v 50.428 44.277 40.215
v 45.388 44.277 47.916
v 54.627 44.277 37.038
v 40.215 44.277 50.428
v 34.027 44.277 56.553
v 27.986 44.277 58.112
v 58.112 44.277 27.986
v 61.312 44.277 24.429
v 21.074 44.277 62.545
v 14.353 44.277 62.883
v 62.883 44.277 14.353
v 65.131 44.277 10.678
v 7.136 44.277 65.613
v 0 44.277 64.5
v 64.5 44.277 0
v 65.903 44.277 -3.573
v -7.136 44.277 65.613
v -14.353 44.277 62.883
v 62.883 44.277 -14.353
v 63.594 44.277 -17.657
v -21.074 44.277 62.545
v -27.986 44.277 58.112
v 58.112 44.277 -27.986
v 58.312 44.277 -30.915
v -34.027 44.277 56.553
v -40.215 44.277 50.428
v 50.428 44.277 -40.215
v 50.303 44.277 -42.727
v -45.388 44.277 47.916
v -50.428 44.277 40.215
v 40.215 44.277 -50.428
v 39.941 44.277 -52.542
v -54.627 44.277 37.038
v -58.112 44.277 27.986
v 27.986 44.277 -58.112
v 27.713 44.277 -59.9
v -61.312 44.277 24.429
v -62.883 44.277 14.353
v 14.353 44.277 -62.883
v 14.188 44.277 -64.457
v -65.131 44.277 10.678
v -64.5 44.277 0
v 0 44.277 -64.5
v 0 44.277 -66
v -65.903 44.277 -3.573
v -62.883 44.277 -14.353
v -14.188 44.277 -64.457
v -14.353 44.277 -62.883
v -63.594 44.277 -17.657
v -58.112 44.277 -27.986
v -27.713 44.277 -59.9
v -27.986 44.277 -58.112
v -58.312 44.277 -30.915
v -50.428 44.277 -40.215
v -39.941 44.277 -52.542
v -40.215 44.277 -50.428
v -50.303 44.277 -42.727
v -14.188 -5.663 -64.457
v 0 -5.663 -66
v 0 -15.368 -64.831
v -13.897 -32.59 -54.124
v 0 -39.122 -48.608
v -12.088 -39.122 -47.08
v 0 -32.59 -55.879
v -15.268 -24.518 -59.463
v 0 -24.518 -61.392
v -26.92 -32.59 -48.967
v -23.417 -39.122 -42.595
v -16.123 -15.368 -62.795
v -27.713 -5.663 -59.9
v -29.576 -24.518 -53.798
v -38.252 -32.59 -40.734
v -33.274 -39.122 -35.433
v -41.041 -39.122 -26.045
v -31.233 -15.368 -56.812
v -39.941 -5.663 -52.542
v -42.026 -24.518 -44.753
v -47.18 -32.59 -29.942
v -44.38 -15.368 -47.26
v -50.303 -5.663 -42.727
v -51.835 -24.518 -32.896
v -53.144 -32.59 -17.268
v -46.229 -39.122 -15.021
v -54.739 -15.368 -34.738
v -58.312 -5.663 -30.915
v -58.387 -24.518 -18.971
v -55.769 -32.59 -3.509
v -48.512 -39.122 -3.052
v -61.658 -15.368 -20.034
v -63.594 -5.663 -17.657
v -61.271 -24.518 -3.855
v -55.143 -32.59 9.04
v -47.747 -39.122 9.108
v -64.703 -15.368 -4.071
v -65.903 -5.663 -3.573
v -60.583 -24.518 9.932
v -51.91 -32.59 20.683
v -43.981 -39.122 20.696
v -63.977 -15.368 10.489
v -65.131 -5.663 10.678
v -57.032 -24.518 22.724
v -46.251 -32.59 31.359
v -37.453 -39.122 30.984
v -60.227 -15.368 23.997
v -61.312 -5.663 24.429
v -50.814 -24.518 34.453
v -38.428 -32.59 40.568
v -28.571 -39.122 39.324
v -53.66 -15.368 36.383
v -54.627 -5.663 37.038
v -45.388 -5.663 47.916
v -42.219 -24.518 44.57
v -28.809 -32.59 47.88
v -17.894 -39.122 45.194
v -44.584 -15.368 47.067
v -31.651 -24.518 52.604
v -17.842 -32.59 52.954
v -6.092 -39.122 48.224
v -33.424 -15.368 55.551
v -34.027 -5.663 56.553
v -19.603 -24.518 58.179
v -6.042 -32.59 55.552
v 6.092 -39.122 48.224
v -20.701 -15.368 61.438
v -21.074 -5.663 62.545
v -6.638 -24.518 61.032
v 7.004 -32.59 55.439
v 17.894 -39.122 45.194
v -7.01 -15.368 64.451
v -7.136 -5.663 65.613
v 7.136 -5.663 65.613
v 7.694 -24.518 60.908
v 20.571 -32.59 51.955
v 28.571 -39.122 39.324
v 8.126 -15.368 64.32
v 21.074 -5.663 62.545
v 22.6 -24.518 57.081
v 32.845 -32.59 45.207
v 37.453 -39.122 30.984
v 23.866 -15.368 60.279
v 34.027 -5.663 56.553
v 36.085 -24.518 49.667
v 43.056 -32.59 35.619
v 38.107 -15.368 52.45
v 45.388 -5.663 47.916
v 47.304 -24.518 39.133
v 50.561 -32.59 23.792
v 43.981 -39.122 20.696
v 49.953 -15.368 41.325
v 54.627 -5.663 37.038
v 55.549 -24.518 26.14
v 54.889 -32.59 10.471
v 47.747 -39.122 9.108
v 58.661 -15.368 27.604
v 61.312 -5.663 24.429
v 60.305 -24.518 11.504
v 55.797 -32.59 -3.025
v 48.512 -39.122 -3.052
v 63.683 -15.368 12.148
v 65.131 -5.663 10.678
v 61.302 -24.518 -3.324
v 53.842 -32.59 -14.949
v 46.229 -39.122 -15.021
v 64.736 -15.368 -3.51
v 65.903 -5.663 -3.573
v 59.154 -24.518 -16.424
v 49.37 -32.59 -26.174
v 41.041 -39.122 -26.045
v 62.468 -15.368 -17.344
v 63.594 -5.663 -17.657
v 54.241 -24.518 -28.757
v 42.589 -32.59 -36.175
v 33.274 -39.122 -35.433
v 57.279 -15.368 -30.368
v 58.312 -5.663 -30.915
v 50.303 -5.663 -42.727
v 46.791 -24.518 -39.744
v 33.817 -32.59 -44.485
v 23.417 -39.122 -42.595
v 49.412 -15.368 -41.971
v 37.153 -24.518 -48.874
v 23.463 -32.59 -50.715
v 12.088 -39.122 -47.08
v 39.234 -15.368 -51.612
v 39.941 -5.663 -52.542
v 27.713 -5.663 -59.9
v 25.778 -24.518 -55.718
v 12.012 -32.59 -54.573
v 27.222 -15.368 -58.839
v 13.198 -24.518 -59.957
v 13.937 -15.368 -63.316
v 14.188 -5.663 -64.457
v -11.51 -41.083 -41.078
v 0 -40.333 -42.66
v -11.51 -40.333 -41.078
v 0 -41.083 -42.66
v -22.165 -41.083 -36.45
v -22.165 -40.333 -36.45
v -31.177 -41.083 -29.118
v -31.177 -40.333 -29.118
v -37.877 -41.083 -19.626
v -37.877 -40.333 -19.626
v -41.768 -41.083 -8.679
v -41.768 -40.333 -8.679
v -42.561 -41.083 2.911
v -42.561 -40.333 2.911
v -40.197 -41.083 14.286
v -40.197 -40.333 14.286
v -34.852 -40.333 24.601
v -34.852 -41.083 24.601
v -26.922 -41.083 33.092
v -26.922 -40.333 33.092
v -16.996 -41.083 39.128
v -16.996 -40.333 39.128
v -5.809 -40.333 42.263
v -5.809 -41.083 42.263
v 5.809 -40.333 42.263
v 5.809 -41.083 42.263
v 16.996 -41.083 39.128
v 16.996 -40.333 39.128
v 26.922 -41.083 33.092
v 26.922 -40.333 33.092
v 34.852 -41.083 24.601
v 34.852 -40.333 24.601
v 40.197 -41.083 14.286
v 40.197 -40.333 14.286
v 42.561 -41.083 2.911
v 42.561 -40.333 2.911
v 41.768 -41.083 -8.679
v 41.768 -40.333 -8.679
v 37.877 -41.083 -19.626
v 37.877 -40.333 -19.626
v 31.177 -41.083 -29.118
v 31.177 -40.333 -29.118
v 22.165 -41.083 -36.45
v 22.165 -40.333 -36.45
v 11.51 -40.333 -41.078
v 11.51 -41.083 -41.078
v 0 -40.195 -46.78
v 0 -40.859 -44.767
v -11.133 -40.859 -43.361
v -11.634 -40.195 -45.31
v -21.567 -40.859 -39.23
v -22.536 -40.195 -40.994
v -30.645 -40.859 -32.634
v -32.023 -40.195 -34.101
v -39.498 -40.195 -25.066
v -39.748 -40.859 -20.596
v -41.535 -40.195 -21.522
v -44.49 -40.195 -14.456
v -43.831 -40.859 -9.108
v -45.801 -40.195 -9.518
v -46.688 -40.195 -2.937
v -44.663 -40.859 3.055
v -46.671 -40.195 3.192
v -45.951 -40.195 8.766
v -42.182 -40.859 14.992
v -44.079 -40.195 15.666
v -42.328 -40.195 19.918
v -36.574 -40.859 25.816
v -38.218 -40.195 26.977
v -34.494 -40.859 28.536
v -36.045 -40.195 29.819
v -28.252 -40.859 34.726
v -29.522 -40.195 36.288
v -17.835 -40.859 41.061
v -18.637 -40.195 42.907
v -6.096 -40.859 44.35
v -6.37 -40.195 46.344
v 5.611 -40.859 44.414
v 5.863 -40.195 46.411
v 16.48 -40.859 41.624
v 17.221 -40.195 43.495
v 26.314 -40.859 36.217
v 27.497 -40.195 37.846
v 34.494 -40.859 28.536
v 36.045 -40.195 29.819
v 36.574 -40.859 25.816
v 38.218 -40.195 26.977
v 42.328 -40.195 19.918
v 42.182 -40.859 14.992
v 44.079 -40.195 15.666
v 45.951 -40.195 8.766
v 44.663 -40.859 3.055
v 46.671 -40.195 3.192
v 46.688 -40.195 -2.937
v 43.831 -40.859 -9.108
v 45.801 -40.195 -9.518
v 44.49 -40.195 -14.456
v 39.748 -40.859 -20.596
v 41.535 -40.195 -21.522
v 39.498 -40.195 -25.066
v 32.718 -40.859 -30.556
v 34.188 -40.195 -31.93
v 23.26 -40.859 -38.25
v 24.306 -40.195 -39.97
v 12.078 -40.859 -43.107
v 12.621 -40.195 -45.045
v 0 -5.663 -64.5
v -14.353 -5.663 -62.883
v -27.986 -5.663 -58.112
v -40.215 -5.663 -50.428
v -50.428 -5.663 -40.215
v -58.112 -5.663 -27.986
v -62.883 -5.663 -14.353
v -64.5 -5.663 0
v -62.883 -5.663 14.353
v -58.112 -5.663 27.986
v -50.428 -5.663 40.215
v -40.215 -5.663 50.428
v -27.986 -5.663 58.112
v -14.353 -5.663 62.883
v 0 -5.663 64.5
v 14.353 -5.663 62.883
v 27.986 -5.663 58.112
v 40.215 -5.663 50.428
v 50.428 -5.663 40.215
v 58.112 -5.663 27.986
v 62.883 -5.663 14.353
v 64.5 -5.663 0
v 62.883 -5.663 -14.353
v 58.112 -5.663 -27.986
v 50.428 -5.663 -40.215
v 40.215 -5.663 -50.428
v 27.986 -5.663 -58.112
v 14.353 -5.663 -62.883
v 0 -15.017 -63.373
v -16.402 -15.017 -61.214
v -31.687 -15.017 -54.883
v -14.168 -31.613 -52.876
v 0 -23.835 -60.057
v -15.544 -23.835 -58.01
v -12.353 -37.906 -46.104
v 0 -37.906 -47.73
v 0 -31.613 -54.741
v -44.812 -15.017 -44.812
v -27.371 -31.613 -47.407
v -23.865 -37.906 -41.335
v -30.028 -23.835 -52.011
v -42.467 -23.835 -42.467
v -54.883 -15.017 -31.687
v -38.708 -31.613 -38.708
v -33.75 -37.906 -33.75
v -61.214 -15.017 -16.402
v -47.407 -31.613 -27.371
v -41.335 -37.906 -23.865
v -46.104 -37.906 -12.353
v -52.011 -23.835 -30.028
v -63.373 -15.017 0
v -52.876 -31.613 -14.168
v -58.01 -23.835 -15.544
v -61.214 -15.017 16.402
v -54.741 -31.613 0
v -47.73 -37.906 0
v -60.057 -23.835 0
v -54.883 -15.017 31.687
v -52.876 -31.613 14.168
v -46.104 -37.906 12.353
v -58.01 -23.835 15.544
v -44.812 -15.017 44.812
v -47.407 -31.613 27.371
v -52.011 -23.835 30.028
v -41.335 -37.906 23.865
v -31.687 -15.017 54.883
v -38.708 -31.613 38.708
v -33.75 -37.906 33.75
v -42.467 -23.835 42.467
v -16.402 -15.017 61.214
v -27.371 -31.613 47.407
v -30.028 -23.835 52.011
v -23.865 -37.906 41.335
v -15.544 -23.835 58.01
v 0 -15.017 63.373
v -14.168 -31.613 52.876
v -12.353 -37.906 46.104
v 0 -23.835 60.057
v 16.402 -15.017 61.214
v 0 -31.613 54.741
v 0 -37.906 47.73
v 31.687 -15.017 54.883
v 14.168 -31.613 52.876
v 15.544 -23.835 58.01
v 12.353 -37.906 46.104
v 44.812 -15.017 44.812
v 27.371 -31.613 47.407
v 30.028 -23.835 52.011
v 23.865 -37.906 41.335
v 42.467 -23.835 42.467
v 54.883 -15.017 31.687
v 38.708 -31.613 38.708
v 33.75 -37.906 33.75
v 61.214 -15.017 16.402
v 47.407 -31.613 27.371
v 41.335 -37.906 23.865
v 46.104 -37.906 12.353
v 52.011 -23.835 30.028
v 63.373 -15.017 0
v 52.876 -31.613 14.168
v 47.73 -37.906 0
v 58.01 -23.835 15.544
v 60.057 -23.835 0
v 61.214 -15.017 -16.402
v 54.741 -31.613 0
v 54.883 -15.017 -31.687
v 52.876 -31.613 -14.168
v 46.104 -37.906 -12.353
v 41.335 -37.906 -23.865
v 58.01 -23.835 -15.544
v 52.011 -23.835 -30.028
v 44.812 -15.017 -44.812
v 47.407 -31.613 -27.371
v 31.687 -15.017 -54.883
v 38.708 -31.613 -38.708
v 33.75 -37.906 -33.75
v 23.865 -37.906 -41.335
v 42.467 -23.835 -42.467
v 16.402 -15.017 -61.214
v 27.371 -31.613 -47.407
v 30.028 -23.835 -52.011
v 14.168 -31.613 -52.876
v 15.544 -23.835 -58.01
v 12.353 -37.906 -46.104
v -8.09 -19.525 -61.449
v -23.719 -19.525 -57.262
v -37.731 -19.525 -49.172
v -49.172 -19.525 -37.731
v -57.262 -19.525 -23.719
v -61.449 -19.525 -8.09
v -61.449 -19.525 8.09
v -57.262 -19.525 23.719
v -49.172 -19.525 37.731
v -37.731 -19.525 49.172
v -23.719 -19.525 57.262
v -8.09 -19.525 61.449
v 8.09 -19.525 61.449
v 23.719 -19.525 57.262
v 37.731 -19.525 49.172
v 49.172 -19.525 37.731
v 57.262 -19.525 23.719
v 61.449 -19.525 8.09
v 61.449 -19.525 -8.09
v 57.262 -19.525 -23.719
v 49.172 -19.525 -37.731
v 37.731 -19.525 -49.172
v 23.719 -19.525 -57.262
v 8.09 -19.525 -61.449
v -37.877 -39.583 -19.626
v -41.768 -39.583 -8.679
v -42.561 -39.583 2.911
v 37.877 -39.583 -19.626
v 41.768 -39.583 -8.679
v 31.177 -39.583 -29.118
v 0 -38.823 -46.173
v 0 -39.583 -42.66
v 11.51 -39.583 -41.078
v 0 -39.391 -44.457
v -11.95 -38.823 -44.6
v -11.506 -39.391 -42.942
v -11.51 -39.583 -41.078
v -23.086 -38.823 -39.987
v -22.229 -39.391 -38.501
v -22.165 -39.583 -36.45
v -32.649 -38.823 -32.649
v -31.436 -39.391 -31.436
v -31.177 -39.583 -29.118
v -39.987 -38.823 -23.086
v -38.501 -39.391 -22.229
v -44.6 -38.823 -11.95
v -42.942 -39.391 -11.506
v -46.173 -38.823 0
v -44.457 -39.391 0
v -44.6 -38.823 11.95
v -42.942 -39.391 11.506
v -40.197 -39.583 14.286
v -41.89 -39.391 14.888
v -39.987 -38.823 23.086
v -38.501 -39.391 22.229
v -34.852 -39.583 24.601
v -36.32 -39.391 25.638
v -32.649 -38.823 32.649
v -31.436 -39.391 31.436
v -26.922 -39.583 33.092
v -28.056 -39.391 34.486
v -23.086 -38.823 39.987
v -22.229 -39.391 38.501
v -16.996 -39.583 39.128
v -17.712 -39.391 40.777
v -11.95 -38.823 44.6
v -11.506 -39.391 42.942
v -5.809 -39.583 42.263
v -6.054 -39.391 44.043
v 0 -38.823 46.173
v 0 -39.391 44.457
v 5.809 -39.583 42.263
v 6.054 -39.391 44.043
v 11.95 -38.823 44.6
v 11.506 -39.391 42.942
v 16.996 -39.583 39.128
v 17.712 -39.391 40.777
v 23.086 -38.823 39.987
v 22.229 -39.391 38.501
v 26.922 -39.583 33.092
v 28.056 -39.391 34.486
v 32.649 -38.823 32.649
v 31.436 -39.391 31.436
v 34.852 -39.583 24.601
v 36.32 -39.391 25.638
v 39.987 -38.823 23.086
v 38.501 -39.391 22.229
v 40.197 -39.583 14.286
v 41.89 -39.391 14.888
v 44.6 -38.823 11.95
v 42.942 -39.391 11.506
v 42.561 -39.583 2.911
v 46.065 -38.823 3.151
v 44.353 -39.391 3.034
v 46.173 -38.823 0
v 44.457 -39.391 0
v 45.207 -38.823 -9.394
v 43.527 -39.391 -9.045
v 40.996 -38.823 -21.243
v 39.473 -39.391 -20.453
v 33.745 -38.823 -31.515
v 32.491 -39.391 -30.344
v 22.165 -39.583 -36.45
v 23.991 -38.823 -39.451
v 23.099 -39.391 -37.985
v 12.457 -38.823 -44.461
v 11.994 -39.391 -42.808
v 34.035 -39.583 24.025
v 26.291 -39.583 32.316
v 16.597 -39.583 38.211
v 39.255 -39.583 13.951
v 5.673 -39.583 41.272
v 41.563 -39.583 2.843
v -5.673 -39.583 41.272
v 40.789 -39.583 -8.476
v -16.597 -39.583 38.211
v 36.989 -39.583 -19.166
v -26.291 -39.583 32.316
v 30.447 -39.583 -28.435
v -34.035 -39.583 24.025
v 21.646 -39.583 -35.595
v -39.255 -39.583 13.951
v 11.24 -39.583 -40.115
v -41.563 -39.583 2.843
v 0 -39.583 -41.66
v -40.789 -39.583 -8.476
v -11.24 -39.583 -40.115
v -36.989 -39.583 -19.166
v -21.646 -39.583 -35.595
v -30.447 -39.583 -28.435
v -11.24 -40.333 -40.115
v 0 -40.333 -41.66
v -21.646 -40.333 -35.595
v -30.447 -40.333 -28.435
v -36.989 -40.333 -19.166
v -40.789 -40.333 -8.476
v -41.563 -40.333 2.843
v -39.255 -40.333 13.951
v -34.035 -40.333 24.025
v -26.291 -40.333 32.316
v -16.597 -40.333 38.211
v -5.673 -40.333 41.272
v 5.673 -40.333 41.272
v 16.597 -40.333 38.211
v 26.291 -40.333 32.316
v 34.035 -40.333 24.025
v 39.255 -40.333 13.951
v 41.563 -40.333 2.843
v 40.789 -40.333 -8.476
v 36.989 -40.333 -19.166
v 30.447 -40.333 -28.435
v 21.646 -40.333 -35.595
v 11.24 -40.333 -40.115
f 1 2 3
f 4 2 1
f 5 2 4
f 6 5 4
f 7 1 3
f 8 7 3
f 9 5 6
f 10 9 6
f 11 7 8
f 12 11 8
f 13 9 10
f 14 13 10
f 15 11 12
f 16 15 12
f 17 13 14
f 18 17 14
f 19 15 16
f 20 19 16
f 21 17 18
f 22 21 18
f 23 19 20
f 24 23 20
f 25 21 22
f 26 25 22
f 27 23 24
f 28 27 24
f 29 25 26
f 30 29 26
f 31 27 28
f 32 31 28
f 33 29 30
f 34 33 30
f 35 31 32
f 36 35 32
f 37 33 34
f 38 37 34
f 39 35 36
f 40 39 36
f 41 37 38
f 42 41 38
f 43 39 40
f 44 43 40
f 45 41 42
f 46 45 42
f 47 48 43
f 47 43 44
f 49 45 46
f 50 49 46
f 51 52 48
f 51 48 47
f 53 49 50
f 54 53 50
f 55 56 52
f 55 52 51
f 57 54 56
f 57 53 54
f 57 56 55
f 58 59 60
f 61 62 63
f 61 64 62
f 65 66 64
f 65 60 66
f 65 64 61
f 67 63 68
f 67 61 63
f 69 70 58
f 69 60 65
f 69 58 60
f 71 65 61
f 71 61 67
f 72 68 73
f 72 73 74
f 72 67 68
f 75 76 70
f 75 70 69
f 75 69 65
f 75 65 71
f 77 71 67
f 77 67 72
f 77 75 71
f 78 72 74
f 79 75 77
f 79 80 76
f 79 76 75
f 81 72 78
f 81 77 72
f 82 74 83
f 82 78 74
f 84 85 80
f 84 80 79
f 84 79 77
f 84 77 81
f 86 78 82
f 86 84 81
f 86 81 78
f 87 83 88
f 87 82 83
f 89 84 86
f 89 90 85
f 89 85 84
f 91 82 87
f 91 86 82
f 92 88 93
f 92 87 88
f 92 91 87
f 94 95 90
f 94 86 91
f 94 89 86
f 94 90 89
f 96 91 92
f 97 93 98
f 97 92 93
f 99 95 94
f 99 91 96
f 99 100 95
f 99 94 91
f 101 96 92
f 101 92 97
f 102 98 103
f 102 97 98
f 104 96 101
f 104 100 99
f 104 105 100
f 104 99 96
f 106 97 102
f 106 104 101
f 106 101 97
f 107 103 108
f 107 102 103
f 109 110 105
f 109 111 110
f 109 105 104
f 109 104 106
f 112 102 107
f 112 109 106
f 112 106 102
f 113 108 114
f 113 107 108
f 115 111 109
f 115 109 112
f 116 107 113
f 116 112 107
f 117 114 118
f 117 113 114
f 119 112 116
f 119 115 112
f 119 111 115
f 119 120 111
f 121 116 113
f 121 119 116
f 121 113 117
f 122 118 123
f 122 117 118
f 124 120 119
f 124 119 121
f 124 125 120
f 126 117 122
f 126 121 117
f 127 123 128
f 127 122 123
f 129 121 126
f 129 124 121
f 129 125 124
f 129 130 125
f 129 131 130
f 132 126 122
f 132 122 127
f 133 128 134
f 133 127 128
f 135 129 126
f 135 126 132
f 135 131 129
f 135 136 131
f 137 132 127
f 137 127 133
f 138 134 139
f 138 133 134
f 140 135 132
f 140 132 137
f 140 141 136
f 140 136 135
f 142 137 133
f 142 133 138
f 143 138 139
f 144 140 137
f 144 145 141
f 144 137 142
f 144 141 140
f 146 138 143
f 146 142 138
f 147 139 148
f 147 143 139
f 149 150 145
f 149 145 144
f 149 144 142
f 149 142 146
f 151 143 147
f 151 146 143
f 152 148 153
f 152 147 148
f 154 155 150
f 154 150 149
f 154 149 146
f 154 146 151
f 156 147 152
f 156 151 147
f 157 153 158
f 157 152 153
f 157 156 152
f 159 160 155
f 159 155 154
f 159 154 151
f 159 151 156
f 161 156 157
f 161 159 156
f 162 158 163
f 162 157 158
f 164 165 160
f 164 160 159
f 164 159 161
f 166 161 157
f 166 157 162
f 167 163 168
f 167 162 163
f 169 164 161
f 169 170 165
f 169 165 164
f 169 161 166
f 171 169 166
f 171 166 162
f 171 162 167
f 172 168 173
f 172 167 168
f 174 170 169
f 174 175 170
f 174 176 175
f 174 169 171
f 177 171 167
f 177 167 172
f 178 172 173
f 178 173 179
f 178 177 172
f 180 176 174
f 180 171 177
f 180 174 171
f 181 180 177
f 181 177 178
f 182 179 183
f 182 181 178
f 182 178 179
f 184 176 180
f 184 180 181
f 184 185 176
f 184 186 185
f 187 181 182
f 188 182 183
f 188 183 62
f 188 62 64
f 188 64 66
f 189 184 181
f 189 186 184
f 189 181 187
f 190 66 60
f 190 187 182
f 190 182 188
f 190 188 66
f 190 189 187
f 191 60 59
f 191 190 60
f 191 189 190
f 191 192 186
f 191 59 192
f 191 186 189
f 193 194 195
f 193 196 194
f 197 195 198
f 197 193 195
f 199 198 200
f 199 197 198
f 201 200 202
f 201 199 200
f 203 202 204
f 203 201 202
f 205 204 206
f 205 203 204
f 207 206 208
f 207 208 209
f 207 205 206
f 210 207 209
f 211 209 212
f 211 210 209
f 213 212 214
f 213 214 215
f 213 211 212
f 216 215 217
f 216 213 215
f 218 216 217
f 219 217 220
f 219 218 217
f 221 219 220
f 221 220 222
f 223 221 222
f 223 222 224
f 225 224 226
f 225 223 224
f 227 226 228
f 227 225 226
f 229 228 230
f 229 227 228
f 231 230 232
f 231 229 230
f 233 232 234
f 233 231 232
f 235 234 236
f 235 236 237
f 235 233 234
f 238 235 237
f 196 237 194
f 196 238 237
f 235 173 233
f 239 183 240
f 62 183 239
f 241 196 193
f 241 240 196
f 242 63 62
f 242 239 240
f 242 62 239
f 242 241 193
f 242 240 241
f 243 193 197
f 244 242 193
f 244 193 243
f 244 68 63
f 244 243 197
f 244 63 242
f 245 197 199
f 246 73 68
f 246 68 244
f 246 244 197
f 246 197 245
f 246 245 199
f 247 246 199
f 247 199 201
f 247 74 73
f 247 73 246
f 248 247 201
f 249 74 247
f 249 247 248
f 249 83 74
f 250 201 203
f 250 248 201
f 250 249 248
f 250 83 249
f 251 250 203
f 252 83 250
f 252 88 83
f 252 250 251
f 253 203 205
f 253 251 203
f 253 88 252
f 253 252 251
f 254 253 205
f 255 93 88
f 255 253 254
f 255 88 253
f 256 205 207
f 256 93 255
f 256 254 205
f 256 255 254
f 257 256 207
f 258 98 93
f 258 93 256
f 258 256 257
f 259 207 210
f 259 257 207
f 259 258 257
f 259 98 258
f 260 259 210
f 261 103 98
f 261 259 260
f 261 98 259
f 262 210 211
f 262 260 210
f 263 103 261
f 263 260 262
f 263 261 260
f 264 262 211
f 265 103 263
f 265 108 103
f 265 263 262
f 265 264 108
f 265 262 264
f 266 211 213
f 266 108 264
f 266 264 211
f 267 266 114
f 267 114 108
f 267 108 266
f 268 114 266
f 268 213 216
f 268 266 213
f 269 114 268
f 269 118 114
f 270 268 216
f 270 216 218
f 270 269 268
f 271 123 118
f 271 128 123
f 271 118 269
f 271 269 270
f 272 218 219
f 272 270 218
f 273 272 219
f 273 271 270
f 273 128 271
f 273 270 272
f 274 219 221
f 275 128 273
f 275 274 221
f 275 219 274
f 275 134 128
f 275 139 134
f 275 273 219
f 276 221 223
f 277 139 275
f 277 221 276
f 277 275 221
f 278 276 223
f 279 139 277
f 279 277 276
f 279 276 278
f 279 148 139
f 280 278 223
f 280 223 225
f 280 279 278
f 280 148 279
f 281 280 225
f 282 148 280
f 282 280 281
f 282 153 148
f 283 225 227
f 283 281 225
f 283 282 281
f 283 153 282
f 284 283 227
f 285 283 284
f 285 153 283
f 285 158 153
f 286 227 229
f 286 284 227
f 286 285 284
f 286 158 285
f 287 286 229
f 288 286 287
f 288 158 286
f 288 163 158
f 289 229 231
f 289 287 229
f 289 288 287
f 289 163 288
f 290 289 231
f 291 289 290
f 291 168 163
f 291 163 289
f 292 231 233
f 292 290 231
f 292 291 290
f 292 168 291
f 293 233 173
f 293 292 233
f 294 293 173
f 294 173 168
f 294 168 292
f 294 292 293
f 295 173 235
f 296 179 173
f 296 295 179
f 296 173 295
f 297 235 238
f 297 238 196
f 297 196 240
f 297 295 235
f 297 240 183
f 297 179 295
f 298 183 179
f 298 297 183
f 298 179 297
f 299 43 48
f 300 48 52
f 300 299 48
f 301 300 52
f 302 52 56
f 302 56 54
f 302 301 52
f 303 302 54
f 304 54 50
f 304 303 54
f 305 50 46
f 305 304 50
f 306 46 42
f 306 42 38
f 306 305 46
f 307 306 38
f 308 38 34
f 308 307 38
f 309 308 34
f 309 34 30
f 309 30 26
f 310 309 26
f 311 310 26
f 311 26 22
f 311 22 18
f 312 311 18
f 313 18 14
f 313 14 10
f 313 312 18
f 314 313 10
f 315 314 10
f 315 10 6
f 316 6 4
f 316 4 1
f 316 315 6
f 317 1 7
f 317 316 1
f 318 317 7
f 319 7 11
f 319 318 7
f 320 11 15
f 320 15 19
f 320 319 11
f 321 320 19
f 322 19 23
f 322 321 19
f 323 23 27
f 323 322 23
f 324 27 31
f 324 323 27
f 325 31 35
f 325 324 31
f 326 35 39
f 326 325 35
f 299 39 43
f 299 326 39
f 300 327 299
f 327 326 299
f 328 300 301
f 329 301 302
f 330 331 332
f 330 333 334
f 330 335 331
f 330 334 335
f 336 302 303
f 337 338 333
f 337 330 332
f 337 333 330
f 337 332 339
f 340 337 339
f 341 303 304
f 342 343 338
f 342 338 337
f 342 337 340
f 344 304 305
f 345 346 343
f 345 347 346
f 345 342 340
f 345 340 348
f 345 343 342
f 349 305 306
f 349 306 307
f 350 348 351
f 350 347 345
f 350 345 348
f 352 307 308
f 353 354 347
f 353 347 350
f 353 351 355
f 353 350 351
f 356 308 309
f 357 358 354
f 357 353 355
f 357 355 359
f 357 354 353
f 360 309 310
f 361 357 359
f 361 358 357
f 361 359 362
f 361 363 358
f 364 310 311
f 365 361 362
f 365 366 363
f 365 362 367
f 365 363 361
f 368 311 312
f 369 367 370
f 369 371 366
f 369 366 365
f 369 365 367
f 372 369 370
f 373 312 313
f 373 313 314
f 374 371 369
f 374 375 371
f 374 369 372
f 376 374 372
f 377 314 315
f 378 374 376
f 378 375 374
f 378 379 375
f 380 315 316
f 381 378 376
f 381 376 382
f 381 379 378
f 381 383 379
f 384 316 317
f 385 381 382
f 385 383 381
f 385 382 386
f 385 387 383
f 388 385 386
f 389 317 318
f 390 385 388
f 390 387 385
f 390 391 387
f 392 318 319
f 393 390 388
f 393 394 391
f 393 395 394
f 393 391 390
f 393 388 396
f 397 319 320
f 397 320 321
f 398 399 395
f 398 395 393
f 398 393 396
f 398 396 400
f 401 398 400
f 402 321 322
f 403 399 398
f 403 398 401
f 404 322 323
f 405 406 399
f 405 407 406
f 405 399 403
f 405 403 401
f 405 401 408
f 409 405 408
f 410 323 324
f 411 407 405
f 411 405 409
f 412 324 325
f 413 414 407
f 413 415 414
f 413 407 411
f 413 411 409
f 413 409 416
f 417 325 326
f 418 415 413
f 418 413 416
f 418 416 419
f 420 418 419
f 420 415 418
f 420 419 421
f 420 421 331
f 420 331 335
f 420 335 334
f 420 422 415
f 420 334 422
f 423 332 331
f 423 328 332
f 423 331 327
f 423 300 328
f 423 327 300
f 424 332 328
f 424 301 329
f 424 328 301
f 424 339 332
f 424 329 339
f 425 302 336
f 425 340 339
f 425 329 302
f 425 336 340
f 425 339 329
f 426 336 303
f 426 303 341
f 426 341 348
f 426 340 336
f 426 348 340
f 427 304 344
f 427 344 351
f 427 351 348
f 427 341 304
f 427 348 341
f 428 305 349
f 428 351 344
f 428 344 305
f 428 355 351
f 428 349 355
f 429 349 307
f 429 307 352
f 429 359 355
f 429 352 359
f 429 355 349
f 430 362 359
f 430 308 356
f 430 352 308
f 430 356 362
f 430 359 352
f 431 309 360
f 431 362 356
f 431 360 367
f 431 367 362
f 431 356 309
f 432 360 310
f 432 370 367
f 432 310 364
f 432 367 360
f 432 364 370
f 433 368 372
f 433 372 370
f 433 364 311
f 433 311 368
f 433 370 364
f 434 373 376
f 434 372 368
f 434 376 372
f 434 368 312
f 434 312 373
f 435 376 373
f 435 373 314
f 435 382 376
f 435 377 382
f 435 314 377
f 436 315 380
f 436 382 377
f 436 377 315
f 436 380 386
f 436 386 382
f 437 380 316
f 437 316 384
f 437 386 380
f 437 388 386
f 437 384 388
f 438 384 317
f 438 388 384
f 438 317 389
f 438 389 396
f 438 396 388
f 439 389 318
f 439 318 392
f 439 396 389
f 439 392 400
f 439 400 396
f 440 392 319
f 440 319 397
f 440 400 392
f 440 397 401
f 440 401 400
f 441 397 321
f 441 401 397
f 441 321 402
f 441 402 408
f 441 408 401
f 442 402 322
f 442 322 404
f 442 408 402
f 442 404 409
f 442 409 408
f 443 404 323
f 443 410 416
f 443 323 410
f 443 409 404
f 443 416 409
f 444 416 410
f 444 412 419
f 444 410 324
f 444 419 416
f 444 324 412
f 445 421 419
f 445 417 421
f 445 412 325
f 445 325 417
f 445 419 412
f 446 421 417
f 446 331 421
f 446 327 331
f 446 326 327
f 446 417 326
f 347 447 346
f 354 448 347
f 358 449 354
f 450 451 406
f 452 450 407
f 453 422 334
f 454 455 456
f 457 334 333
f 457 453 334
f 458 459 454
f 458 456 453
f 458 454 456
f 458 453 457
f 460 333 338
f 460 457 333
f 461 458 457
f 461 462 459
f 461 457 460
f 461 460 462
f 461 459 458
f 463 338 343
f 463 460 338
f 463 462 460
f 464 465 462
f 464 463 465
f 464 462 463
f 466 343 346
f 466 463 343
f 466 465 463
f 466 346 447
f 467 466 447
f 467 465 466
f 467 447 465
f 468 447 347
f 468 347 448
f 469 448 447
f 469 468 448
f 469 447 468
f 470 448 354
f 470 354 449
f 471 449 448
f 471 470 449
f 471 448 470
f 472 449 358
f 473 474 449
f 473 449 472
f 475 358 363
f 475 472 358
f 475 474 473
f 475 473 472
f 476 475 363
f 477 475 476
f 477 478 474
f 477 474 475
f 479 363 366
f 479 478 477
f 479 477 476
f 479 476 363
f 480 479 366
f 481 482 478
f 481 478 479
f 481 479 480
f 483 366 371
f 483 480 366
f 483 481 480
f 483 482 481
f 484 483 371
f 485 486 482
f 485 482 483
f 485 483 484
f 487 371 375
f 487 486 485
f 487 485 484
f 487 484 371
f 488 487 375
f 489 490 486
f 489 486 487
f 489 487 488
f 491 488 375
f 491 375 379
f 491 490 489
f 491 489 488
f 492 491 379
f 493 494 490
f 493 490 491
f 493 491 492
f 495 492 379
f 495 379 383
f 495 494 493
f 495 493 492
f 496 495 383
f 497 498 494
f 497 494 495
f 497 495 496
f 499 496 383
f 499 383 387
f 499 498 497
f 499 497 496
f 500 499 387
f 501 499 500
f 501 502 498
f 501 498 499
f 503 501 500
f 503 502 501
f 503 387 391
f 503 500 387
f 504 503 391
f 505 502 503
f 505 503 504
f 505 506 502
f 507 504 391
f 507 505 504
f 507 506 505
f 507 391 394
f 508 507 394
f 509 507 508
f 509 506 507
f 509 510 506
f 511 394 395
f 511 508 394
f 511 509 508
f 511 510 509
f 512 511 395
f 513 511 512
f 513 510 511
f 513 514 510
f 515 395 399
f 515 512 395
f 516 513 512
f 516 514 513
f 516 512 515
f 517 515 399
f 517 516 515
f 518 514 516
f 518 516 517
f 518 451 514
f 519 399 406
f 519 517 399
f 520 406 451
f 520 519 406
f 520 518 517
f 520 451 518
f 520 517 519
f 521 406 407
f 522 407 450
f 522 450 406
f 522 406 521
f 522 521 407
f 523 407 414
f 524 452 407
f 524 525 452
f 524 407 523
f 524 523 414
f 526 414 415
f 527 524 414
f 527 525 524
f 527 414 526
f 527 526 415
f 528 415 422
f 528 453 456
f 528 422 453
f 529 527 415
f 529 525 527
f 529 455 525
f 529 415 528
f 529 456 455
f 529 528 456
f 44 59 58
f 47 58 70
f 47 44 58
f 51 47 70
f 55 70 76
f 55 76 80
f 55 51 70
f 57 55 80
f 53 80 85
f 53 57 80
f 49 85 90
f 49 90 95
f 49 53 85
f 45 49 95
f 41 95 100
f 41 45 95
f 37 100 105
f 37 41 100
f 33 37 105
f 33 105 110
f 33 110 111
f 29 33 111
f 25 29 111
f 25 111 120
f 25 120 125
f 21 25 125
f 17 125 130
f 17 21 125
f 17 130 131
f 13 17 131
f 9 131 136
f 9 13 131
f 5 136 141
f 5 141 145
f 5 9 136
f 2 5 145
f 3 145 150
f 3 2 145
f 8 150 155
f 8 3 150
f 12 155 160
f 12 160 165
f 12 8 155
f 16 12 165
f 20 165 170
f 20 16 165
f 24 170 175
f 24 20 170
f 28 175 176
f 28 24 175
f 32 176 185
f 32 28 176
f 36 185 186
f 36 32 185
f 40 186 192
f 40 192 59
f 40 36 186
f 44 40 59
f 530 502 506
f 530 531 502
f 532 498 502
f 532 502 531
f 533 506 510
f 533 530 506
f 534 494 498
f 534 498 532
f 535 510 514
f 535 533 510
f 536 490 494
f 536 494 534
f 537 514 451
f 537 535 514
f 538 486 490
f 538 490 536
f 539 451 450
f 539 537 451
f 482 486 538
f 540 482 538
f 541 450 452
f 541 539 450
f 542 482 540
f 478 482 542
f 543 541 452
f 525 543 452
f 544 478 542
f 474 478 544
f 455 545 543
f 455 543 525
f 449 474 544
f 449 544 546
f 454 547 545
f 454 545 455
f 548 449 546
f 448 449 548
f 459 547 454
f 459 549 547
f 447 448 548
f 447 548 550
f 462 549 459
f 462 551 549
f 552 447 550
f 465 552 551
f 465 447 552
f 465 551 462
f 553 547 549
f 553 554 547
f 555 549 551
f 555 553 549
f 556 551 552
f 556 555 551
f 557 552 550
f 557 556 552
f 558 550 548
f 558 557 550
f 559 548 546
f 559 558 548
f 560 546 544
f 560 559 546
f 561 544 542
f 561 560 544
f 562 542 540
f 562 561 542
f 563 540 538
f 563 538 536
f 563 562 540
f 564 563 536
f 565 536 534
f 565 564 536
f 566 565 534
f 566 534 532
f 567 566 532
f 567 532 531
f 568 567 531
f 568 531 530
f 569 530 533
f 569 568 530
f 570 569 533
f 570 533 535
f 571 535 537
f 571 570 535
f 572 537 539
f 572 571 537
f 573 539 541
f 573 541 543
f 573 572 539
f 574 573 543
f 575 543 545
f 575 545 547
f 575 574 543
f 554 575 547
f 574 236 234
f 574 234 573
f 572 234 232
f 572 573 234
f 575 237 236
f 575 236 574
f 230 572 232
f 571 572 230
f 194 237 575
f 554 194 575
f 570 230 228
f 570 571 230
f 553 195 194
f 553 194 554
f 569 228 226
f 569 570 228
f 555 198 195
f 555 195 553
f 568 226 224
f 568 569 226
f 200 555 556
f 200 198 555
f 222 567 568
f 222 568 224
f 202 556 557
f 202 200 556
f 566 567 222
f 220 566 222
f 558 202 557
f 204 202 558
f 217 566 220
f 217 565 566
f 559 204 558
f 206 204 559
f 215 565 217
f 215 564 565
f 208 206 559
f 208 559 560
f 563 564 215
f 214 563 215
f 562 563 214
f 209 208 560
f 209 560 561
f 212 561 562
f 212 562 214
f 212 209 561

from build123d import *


with BuildPart() as part:
    # Çizim1 → Döndür1 (revolve)
    with BuildSketch(Plane.XY, mode=Mode.PRIVATE) as d_nd_r1_sk:
        with BuildLine():
            Line((-64.5, 44.27684507), (-64.5, -5.66315493))
            ThreePointArc((-64.5, -5.66315493), (-60.056829884, -23.834624811), (-47.729948316, -37.905590277))
            ThreePointArc((-47.729948316, -37.905590277), (-45.330140403, -39.15287303), (-42.66, -39.58315493))
            Line((-42.66, -39.58315493), (-41.66, -39.58315493))
            Line((-41.66, -39.58315493), (-41.66, -40.33315493))
            Line((-41.66, -40.33315493), (-42.66, -40.33315493))
            Line((-42.66, -40.33315493), (-42.66, -41.08315493))
            ThreePointArc((-42.66, -41.08315493), (-45.791233173, -40.580279695), (-48.607542423, -39.122230693))
            ThreePointArc((-48.607542423, -39.122230693), (-61.392201024, -24.51791117), (-66, -5.66315493))
            Line((-66, -5.66315493), (-66, 44.27684507))
            Line((-66, 44.27684507), (-64.5, 44.27684507))
        make_face()
    revolve(d_nd_r1_sk.sketch.rotate(Axis((0, 0, 0), (0, 1, 0)), 270), axis=Axis((0, 0, 0), (0, 1, 0)))


solid = part.part
